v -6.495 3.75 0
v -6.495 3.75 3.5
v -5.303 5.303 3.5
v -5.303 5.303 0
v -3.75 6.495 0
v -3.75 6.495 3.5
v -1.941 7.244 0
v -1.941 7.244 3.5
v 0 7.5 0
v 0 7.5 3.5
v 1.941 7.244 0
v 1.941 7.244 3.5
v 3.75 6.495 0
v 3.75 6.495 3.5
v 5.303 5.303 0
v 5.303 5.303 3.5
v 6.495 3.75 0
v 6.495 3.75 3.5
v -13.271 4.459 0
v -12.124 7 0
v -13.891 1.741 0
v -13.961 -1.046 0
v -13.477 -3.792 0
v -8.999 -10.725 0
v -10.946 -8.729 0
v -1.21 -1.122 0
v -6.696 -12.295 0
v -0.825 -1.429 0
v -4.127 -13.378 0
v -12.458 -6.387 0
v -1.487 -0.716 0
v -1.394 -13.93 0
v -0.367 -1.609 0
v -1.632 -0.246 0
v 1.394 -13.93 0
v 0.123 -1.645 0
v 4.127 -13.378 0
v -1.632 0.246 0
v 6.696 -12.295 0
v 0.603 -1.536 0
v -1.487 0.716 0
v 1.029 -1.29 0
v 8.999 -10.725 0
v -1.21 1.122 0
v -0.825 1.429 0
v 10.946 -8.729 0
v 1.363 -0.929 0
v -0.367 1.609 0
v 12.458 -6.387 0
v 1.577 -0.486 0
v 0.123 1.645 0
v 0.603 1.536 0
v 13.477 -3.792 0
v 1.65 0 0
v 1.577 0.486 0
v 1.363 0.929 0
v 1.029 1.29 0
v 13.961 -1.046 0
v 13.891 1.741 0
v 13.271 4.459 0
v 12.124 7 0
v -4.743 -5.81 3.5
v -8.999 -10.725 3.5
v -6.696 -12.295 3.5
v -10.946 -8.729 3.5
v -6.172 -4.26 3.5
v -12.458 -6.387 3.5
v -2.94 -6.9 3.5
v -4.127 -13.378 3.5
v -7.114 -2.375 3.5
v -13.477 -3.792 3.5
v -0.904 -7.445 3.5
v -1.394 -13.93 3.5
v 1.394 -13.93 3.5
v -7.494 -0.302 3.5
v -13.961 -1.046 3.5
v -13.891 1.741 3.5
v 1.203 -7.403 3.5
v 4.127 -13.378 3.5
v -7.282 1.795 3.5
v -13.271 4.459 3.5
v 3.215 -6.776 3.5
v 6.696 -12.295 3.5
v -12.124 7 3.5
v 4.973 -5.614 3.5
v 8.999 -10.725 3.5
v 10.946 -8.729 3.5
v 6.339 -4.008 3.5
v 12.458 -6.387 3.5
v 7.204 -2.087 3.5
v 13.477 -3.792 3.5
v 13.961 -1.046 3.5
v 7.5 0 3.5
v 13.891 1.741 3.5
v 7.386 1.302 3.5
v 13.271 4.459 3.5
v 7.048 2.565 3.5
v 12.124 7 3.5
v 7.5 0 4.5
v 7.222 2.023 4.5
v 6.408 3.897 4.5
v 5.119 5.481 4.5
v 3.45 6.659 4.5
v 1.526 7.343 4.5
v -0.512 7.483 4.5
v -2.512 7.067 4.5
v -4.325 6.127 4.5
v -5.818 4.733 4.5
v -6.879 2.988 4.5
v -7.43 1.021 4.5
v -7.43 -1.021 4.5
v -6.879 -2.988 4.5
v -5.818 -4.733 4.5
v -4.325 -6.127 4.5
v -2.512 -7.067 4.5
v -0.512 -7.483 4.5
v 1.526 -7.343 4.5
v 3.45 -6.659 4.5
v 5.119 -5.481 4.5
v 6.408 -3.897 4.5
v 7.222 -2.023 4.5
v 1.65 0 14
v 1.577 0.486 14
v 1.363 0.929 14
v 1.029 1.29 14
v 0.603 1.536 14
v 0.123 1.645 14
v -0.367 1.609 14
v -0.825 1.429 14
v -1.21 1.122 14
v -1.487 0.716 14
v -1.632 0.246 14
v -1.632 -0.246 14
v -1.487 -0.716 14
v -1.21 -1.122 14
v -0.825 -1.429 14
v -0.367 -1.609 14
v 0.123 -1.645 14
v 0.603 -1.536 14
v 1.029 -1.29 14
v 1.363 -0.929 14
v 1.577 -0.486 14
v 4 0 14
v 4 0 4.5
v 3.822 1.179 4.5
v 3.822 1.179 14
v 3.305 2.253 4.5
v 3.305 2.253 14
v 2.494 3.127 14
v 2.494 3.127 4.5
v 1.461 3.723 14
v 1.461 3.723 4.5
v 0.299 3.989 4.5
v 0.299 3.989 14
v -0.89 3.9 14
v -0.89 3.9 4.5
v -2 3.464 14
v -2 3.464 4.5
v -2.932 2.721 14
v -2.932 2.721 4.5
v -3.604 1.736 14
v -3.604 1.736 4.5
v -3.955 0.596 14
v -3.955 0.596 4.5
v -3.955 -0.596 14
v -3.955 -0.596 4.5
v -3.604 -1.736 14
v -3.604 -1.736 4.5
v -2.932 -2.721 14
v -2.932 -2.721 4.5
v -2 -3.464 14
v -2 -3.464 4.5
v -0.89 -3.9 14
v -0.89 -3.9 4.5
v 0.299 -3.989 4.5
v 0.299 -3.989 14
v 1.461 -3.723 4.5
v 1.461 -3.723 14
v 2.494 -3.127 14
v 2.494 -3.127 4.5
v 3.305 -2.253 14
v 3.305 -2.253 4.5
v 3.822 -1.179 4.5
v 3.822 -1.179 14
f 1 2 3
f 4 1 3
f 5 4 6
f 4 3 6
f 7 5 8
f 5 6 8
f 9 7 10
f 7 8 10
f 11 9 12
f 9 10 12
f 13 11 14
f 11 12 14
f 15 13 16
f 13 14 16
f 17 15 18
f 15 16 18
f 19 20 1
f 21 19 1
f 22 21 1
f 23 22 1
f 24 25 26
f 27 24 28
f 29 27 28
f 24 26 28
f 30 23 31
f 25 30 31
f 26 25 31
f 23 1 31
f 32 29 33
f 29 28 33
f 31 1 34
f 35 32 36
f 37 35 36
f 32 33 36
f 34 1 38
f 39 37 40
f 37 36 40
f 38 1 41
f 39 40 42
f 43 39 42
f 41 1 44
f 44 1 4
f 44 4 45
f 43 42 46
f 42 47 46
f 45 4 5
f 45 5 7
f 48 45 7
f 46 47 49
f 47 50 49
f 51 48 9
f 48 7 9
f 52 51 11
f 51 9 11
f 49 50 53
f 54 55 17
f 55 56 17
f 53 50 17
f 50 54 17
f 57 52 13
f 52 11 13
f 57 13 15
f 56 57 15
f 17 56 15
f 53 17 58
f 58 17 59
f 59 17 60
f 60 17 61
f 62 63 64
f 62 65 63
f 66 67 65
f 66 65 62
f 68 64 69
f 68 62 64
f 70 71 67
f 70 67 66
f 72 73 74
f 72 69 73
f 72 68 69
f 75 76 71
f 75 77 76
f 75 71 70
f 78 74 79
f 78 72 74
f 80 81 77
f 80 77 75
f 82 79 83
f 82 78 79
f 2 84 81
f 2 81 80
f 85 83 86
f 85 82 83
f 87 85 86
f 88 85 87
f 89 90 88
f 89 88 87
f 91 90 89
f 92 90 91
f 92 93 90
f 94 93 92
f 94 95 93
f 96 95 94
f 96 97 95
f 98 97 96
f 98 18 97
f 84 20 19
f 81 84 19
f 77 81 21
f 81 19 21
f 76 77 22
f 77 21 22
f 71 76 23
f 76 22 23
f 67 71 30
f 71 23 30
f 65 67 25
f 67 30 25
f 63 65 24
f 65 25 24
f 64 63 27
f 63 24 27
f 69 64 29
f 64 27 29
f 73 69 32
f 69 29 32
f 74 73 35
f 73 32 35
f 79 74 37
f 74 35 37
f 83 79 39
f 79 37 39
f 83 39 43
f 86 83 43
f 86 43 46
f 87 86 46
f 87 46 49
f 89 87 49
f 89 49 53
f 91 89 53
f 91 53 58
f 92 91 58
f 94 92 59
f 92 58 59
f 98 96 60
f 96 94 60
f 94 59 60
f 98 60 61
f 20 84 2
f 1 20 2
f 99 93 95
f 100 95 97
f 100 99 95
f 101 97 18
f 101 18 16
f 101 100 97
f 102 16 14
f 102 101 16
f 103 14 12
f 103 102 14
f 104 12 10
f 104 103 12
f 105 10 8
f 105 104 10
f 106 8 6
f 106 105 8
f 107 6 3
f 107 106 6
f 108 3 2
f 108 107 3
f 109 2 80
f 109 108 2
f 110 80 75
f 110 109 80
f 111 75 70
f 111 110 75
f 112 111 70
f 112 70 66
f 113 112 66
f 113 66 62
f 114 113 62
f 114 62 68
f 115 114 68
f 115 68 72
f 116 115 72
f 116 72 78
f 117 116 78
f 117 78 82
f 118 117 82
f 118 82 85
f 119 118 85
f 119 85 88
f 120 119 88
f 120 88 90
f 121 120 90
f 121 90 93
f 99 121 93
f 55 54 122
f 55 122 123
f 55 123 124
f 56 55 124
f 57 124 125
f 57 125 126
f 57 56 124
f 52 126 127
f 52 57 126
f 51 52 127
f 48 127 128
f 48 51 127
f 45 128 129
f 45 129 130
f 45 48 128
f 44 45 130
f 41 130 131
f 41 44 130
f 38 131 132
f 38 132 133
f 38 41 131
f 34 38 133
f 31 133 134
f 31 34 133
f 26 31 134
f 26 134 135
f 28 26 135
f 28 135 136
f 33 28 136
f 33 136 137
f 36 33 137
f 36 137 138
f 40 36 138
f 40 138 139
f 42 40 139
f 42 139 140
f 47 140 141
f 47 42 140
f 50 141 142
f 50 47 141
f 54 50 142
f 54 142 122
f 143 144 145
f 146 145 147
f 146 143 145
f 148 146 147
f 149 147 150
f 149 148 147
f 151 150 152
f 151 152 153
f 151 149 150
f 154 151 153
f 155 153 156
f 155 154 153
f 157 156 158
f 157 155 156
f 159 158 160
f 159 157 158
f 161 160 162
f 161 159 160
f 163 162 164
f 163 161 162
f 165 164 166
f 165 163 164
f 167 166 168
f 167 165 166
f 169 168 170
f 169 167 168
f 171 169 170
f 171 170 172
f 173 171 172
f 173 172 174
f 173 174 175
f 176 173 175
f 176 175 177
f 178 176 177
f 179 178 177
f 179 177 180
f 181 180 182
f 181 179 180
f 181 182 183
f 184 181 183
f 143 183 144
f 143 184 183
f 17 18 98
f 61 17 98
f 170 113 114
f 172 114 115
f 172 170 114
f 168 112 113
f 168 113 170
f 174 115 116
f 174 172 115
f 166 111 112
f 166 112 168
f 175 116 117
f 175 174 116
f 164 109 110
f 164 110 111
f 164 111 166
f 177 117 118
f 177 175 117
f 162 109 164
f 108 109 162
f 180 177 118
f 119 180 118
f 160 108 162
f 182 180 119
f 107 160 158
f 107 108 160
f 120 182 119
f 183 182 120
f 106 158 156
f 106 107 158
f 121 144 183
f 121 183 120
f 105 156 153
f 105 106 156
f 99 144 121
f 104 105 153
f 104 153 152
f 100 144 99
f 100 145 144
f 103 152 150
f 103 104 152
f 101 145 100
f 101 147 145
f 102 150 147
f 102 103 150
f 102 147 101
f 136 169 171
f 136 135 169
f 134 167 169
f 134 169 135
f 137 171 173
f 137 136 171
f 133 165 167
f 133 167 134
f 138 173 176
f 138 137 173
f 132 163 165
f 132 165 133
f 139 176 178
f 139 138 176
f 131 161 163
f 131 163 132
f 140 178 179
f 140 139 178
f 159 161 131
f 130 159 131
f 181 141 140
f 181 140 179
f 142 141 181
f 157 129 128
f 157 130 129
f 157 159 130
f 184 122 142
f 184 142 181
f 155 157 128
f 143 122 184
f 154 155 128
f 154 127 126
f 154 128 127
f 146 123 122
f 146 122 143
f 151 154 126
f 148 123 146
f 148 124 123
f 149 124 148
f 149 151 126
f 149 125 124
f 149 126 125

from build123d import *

# Parameters (mm, degrees)
SKETCH1_R           = 14
SKETCH1_R_2         = 1.65
BOSS_EXTRUDE1_DEPTH = 14
SKETCH2_R           = 14
SKETCH2_R_2         = 4
CUT_EXTRUDE1_DEPTH  = 9.5
SKETCH3_R           = 14
SKETCH3_R_2         = 7.5
CUT_EXTRUDE2_DEPTH  = 1
CUT_EXTRUDE3_DEPTH  = 4.5


with BuildPart() as part:
    # Sketch1 → Boss-Extrude1 (new body)
    with BuildSketch(Plane.XY):
        Circle(SKETCH1_R)
        Circle(SKETCH1_R_2, mode=Mode.SUBTRACT)
    extrude(amount=BOSS_EXTRUDE1_DEPTH)

    # Sketch2 → Cut-Extrude1 (cut)
    with BuildSketch(Plane.XY.offset(14)):
        Circle(SKETCH2_R)
        Circle(SKETCH2_R_2, mode=Mode.SUBTRACT)
    extrude(amount=-CUT_EXTRUDE1_DEPTH, mode=Mode.SUBTRACT)

    # Sketch3 → Cut-Extrude2 (cut)
    with BuildSketch(Plane.XY.offset(4.5)):
        Circle(SKETCH3_R)
        Circle(SKETCH3_R_2, mode=Mode.SUBTRACT)
    extrude(amount=-CUT_EXTRUDE2_DEPTH, mode=Mode.SUBTRACT)

    # Sketch4 → Cut-Extrude3 (cut, through all)
    with BuildSketch(Plane.XY.offset(3.5)):
        with BuildLine():
            Line((6.495190528, 3.75), (12.124355653, 7))
            ThreePointArc((12.124355653, 7), (0, 14), (-12.124355653, 7))
            Line((-12.124355653, 7), (-6.495190528, 3.75))
            ThreePointArc((-6.495190528, 3.75), (0, 7.5), (6.495190528, 3.75))
        make_face()
    extrude(amount=-CUT_EXTRUDE3_DEPTH, mode=Mode.SUBTRACT)


solid = part.part
